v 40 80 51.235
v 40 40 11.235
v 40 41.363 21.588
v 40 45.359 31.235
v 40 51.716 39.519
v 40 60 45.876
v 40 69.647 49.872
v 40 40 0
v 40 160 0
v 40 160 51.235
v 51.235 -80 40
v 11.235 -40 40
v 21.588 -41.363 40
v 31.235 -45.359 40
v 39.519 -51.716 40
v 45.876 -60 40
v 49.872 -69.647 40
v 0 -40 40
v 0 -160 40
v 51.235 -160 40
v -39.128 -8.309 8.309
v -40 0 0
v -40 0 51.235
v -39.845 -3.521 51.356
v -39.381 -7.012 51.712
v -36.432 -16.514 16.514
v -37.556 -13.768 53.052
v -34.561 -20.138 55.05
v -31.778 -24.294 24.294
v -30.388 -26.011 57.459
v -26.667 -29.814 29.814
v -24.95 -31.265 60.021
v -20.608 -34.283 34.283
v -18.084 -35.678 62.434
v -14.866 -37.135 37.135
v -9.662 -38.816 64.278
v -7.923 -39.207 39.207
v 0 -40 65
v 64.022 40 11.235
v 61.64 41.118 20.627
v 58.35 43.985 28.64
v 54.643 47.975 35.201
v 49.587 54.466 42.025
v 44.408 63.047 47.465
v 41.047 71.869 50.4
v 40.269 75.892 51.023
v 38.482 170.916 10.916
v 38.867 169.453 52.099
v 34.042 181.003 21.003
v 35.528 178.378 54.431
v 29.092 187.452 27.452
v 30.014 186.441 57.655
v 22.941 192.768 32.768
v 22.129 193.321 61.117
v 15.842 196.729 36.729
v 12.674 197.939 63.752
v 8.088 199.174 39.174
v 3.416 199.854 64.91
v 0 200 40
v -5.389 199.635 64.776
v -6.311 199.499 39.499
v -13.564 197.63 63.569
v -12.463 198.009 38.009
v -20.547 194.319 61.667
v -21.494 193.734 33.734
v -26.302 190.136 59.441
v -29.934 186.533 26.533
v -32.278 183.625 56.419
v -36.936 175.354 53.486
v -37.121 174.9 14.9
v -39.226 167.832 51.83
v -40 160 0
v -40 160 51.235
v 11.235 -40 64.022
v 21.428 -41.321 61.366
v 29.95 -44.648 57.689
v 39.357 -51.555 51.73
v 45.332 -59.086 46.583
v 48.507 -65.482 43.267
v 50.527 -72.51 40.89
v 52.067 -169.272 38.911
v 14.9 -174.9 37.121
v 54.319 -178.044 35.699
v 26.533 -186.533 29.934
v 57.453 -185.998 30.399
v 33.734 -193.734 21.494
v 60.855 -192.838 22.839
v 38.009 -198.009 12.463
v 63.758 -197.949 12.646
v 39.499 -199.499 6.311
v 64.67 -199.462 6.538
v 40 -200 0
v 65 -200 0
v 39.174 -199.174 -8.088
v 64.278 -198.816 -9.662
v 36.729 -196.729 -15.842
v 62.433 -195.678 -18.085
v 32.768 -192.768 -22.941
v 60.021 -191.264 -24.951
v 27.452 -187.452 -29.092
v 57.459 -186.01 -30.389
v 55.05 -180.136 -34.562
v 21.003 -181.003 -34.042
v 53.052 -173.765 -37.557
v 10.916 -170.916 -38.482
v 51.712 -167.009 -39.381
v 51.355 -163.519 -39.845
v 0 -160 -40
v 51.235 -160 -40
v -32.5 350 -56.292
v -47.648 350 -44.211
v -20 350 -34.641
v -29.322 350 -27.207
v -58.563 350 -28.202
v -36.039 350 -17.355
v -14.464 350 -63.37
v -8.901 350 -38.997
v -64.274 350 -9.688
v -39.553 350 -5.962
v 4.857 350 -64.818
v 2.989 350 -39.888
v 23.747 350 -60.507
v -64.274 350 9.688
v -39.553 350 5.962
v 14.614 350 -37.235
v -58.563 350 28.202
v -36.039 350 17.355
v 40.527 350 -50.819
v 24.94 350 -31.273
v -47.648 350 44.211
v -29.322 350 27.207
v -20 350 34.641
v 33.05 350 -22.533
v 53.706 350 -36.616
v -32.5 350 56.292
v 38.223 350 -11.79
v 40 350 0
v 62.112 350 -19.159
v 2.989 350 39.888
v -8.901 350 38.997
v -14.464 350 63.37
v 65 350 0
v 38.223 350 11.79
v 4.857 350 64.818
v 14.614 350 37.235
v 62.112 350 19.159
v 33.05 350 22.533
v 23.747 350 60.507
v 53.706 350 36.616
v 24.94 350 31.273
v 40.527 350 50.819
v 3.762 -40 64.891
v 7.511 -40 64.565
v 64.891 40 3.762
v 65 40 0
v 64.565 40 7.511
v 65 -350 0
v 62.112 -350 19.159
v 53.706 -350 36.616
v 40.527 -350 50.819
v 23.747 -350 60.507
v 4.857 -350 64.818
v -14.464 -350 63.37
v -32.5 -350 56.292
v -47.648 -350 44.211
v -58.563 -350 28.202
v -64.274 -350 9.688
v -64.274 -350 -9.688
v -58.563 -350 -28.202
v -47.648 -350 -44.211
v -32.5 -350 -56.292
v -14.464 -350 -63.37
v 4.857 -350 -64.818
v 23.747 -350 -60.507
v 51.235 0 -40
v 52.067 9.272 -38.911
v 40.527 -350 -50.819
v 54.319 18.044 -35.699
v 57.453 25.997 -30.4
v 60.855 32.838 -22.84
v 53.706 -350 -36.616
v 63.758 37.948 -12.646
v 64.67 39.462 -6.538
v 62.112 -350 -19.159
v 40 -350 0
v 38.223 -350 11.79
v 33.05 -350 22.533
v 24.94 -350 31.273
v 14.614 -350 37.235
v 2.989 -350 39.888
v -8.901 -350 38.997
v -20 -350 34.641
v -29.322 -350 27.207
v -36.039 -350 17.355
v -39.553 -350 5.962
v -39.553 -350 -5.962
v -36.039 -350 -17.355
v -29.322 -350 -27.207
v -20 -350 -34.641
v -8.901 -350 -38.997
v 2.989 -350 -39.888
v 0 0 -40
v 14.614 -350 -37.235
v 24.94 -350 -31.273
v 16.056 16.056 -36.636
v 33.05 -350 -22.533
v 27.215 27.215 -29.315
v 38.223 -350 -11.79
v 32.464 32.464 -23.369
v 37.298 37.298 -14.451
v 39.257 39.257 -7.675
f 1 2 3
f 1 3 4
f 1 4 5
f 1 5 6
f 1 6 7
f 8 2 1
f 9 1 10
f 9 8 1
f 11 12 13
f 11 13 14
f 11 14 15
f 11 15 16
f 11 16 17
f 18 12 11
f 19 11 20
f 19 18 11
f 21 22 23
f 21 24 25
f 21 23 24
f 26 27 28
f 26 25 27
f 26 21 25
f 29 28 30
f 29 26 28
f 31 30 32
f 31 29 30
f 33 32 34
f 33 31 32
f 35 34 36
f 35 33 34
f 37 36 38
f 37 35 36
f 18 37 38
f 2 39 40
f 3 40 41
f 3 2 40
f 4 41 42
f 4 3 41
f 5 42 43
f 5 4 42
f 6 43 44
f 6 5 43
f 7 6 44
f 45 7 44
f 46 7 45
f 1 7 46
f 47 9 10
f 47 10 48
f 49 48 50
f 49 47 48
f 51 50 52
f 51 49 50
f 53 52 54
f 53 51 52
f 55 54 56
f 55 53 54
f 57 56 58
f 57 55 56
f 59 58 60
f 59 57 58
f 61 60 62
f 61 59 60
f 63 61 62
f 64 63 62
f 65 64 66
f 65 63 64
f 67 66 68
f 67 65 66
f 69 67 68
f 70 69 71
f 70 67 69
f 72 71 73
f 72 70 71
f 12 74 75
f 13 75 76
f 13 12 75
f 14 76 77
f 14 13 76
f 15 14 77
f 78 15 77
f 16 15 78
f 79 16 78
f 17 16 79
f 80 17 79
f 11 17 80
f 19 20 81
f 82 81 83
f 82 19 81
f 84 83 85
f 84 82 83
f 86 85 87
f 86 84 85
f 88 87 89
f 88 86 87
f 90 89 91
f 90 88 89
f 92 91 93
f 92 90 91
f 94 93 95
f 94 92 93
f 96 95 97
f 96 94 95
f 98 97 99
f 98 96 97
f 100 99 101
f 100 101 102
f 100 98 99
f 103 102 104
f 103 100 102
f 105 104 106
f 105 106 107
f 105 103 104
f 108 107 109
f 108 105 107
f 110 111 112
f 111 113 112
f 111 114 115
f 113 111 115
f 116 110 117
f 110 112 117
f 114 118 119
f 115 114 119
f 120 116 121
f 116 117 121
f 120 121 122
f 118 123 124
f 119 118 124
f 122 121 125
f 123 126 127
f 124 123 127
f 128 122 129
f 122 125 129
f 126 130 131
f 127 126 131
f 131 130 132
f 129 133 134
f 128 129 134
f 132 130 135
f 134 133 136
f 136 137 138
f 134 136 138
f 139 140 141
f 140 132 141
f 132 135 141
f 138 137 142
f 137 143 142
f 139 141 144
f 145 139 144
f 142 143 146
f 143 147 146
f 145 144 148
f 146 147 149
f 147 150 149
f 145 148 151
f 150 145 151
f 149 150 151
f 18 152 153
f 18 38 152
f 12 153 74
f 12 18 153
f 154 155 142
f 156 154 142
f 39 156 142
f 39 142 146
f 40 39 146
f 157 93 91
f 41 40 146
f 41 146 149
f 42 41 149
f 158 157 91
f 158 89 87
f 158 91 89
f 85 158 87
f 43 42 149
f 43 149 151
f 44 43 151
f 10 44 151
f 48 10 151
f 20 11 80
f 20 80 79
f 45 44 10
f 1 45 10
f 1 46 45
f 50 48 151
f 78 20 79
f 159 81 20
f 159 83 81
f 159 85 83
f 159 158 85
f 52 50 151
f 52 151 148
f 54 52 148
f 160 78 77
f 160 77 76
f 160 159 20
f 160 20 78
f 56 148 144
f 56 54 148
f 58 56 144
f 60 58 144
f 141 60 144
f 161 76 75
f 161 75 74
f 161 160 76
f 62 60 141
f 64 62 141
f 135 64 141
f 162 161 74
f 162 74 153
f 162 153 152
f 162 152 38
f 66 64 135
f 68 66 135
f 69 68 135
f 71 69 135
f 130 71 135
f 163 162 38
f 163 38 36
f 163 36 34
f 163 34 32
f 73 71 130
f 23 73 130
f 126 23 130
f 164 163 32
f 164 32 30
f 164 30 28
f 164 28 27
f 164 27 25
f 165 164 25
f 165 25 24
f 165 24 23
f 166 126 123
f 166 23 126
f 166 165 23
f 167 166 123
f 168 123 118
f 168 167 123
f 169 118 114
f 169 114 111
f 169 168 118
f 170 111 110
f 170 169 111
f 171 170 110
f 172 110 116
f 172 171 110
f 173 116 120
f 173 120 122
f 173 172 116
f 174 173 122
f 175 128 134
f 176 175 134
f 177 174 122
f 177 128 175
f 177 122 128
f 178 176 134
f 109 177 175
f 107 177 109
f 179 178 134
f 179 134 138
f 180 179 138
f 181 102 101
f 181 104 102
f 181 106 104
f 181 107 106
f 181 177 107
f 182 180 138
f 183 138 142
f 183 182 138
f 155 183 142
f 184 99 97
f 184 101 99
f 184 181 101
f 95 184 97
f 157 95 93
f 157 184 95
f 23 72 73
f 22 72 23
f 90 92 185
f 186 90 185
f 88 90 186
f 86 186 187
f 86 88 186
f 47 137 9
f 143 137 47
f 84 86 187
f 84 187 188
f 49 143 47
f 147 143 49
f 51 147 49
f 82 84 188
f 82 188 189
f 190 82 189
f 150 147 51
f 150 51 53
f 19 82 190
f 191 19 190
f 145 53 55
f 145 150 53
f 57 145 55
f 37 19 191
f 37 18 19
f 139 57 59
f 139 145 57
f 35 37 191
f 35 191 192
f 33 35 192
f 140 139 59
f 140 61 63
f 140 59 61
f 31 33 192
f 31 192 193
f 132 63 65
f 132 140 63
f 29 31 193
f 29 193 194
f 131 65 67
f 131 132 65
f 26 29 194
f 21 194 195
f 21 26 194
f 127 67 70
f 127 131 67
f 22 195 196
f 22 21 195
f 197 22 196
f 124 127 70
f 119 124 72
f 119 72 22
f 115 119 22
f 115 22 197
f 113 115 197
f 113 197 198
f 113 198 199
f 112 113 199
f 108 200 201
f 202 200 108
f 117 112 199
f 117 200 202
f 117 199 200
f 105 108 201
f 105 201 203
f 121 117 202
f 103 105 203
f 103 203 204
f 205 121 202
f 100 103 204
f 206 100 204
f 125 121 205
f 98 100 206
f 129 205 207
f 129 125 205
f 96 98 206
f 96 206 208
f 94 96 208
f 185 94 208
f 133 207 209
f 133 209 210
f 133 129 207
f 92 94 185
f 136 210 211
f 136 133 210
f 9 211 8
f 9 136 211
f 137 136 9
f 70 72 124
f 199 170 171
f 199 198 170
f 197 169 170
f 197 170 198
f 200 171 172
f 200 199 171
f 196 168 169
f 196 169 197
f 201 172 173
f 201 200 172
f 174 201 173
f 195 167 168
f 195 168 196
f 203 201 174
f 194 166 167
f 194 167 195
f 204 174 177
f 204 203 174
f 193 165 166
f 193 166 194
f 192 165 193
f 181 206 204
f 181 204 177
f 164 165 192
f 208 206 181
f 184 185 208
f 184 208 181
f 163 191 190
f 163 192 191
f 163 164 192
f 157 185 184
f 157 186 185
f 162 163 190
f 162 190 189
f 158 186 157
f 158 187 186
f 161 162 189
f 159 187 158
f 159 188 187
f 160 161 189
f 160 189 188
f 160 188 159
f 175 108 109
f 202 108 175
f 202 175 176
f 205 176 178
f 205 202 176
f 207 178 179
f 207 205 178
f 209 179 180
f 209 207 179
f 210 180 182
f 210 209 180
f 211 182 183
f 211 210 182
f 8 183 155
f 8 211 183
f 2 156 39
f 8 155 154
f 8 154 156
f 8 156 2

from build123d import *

# Parameters (mm, degrees)
F0_R         = 65
F0_R_2       = 40
F1_DEPTH     = 350
F3_DEPTH     = 65.001
F5_DEPTH     = 65.0010001
F6_T4_DEPTH  = 251.2347538298
F6_S5_R      = 65
F6_T6_DEPTH  = 130
F6_S7_R      = 40
F6_T8_DEPTH  = 130
F6_T12_DEPTH = 251.2347538298
F6_S13_R     = 65
F6_T14_DEPTH = 130
F6_S15_R     = 40
F6_T16_DEPTH = 130
F8_DEPTH     = 65.0010001
F10_DEPTH    = 65.0010001


# Not quite as in the source:
# - a fillet or chamfer that OpenCascade refuses, or shapes differently, is made with other operations: its cross-section is extruded or revolved along the edge and cut away or added


with BuildPart() as f1:
    # F0 (on Front) → F1 (new body, symmetric)
    with BuildSketch(Plane.XZ):
        Circle(F0_R)
        Circle(F0_R_2, mode=Mode.SUBTRACT)
    extrude(amount=F1_DEPTH, both=True)

    # F2 (on Top) → F3 (cut, through all)
    with BuildSketch(Plane.XY):
        with BuildLine():
            ThreePointArc((-40, 160), (0, 120), (40, 160))
            ThreePointArc((40, 160), (0, 200), (-40, 160))
        make_face()
        with BuildLine():
            Line((40, 40), (40, 160))
            ThreePointArc((40, 160), (0, 120), (-40, 160))
            Line((-40, 160), (-40, -40))
            Line((-40, -40), (65, -40))
            Line((65, -40), (65, 40))
            Line((65, 40), (40, 40))
        make_face()
    extrude(amount=F3_DEPTH, mode=Mode.SUBTRACT)

    # F4 (on Right) → F5 (cut, through all)
    with BuildSketch(Plane.YZ):
        with BuildLine():
            ThreePointArc((-160, -40), (-131.7157287525, -28.2842712475), (-120, 0))
            ThreePointArc((-120, 0), (-131.7157287525, 28.2842712475), (-160, 40))
            ThreePointArc((-160, 40), (-200, 0), (-160, -40))
        make_face()
        with BuildLine():
            ThreePointArc((-160, 40), (-131.7157287525, 28.2842712475), (-120, 0))
            ThreePointArc((-120, 0), (-131.7157287525, -28.2842712475), (-160, -40))
            Line((-160, -40), (40, -40))
            Line((40, -40), (40, 65))
            Line((40, 65), (-40, 65))
            Line((-40, 65), (-40, 40))
            Line((-40, 40), (-160, 40))
        make_face()
    extrude(amount=F5_DEPTH, mode=Mode.SUBTRACT)

    # F6: fillet of radius 40 on 2 edges, made by hand


with BuildPart() as f6_tool2:
    # F6_s3 → F6_t4 (new body)
    with BuildSketch(Plane.YZ.offset(-100)):
        with BuildLine():
            ThreePointArc((0, -40), (28.2842712475, -28.2842712475), (40, 0))
            Line((40, 0), (40, -40))
            Line((40, -40), (0, -40))
        make_face()
    extrude(amount=F6_T4_DEPTH)

    # F6_s5 → F6_t6 (intersect, symmetric)
    with BuildSketch(Plane.XZ.offset(-20)):
        Circle(F6_S5_R)
    extrude(amount=F6_T6_DEPTH, both=True, mode=Mode.INTERSECT)

    # F6_s7 → F6_t8 (cut, symmetric)
    with BuildSketch(Plane.XZ.offset(-20)):
        Circle(F6_S7_R)
    extrude(amount=F6_T8_DEPTH, both=True, mode=Mode.SUBTRACT)


with BuildPart() as f1_1:
    add(f1.part)

    # F6_t1: union F6_tool2
    add(f6_tool2.part)


with BuildPart() as f6_tool10:
    # F6_s11 → F6_t12 (new body)
    with BuildSketch(Plane.XY.offset(-100)):
        with BuildLine():
            ThreePointArc((-40, 0), (-28.2842712475, -28.2842712475), (0, -40))
            Line((0, -40), (-40, -40))
            Line((-40, -40), (-40, 0))
        make_face()
    extrude(amount=F6_T12_DEPTH)

    # F6_s13 → F6_t14 (intersect, symmetric)
    with BuildSketch(Plane.XZ.offset(20)):
        Circle(F6_S13_R)
    extrude(amount=F6_T14_DEPTH, both=True, mode=Mode.INTERSECT)

    # F6_s15 → F6_t16 (cut, symmetric)
    with BuildSketch(Plane.XZ.offset(20)):
        Circle(F6_S15_R)
    extrude(amount=F6_T16_DEPTH, both=True, mode=Mode.SUBTRACT)


with BuildPart() as f1_2:
    add(f1_1.part)

    # F6_t9: union F6_tool10
    add(f6_tool10.part)

    # F7 (on Top) → F8 (cut, through all)
    with BuildSketch(Plane.XY):
        with BuildLine():
            ThreePointArc((11.2347538298, -40), (39.5190250773, -51.7157287525), (51.2347538298, -80))
            Line((51.2347538298, -80), (51.2347538298, -40))
            Line((51.2347538298, -40), (11.2347538298, -40))
        make_face()
    extrude(amount=F8_DEPTH, mode=Mode.SUBTRACT)

    # F9 (on Right) → F10 (cut, through all)
    with BuildSketch(Plane.YZ):
        with BuildLine():
            ThreePointArc((40, 11.2347538298), (51.7157287525, 39.5190250773), (80, 51.2347538298))
            Line((80, 51.2347538298), (40, 51.2347538298))
            Line((40, 51.2347538298), (40, 11.2347538298))
        make_face()
    extrude(amount=F10_DEPTH, mode=Mode.SUBTRACT)


solid = f1_2.part
